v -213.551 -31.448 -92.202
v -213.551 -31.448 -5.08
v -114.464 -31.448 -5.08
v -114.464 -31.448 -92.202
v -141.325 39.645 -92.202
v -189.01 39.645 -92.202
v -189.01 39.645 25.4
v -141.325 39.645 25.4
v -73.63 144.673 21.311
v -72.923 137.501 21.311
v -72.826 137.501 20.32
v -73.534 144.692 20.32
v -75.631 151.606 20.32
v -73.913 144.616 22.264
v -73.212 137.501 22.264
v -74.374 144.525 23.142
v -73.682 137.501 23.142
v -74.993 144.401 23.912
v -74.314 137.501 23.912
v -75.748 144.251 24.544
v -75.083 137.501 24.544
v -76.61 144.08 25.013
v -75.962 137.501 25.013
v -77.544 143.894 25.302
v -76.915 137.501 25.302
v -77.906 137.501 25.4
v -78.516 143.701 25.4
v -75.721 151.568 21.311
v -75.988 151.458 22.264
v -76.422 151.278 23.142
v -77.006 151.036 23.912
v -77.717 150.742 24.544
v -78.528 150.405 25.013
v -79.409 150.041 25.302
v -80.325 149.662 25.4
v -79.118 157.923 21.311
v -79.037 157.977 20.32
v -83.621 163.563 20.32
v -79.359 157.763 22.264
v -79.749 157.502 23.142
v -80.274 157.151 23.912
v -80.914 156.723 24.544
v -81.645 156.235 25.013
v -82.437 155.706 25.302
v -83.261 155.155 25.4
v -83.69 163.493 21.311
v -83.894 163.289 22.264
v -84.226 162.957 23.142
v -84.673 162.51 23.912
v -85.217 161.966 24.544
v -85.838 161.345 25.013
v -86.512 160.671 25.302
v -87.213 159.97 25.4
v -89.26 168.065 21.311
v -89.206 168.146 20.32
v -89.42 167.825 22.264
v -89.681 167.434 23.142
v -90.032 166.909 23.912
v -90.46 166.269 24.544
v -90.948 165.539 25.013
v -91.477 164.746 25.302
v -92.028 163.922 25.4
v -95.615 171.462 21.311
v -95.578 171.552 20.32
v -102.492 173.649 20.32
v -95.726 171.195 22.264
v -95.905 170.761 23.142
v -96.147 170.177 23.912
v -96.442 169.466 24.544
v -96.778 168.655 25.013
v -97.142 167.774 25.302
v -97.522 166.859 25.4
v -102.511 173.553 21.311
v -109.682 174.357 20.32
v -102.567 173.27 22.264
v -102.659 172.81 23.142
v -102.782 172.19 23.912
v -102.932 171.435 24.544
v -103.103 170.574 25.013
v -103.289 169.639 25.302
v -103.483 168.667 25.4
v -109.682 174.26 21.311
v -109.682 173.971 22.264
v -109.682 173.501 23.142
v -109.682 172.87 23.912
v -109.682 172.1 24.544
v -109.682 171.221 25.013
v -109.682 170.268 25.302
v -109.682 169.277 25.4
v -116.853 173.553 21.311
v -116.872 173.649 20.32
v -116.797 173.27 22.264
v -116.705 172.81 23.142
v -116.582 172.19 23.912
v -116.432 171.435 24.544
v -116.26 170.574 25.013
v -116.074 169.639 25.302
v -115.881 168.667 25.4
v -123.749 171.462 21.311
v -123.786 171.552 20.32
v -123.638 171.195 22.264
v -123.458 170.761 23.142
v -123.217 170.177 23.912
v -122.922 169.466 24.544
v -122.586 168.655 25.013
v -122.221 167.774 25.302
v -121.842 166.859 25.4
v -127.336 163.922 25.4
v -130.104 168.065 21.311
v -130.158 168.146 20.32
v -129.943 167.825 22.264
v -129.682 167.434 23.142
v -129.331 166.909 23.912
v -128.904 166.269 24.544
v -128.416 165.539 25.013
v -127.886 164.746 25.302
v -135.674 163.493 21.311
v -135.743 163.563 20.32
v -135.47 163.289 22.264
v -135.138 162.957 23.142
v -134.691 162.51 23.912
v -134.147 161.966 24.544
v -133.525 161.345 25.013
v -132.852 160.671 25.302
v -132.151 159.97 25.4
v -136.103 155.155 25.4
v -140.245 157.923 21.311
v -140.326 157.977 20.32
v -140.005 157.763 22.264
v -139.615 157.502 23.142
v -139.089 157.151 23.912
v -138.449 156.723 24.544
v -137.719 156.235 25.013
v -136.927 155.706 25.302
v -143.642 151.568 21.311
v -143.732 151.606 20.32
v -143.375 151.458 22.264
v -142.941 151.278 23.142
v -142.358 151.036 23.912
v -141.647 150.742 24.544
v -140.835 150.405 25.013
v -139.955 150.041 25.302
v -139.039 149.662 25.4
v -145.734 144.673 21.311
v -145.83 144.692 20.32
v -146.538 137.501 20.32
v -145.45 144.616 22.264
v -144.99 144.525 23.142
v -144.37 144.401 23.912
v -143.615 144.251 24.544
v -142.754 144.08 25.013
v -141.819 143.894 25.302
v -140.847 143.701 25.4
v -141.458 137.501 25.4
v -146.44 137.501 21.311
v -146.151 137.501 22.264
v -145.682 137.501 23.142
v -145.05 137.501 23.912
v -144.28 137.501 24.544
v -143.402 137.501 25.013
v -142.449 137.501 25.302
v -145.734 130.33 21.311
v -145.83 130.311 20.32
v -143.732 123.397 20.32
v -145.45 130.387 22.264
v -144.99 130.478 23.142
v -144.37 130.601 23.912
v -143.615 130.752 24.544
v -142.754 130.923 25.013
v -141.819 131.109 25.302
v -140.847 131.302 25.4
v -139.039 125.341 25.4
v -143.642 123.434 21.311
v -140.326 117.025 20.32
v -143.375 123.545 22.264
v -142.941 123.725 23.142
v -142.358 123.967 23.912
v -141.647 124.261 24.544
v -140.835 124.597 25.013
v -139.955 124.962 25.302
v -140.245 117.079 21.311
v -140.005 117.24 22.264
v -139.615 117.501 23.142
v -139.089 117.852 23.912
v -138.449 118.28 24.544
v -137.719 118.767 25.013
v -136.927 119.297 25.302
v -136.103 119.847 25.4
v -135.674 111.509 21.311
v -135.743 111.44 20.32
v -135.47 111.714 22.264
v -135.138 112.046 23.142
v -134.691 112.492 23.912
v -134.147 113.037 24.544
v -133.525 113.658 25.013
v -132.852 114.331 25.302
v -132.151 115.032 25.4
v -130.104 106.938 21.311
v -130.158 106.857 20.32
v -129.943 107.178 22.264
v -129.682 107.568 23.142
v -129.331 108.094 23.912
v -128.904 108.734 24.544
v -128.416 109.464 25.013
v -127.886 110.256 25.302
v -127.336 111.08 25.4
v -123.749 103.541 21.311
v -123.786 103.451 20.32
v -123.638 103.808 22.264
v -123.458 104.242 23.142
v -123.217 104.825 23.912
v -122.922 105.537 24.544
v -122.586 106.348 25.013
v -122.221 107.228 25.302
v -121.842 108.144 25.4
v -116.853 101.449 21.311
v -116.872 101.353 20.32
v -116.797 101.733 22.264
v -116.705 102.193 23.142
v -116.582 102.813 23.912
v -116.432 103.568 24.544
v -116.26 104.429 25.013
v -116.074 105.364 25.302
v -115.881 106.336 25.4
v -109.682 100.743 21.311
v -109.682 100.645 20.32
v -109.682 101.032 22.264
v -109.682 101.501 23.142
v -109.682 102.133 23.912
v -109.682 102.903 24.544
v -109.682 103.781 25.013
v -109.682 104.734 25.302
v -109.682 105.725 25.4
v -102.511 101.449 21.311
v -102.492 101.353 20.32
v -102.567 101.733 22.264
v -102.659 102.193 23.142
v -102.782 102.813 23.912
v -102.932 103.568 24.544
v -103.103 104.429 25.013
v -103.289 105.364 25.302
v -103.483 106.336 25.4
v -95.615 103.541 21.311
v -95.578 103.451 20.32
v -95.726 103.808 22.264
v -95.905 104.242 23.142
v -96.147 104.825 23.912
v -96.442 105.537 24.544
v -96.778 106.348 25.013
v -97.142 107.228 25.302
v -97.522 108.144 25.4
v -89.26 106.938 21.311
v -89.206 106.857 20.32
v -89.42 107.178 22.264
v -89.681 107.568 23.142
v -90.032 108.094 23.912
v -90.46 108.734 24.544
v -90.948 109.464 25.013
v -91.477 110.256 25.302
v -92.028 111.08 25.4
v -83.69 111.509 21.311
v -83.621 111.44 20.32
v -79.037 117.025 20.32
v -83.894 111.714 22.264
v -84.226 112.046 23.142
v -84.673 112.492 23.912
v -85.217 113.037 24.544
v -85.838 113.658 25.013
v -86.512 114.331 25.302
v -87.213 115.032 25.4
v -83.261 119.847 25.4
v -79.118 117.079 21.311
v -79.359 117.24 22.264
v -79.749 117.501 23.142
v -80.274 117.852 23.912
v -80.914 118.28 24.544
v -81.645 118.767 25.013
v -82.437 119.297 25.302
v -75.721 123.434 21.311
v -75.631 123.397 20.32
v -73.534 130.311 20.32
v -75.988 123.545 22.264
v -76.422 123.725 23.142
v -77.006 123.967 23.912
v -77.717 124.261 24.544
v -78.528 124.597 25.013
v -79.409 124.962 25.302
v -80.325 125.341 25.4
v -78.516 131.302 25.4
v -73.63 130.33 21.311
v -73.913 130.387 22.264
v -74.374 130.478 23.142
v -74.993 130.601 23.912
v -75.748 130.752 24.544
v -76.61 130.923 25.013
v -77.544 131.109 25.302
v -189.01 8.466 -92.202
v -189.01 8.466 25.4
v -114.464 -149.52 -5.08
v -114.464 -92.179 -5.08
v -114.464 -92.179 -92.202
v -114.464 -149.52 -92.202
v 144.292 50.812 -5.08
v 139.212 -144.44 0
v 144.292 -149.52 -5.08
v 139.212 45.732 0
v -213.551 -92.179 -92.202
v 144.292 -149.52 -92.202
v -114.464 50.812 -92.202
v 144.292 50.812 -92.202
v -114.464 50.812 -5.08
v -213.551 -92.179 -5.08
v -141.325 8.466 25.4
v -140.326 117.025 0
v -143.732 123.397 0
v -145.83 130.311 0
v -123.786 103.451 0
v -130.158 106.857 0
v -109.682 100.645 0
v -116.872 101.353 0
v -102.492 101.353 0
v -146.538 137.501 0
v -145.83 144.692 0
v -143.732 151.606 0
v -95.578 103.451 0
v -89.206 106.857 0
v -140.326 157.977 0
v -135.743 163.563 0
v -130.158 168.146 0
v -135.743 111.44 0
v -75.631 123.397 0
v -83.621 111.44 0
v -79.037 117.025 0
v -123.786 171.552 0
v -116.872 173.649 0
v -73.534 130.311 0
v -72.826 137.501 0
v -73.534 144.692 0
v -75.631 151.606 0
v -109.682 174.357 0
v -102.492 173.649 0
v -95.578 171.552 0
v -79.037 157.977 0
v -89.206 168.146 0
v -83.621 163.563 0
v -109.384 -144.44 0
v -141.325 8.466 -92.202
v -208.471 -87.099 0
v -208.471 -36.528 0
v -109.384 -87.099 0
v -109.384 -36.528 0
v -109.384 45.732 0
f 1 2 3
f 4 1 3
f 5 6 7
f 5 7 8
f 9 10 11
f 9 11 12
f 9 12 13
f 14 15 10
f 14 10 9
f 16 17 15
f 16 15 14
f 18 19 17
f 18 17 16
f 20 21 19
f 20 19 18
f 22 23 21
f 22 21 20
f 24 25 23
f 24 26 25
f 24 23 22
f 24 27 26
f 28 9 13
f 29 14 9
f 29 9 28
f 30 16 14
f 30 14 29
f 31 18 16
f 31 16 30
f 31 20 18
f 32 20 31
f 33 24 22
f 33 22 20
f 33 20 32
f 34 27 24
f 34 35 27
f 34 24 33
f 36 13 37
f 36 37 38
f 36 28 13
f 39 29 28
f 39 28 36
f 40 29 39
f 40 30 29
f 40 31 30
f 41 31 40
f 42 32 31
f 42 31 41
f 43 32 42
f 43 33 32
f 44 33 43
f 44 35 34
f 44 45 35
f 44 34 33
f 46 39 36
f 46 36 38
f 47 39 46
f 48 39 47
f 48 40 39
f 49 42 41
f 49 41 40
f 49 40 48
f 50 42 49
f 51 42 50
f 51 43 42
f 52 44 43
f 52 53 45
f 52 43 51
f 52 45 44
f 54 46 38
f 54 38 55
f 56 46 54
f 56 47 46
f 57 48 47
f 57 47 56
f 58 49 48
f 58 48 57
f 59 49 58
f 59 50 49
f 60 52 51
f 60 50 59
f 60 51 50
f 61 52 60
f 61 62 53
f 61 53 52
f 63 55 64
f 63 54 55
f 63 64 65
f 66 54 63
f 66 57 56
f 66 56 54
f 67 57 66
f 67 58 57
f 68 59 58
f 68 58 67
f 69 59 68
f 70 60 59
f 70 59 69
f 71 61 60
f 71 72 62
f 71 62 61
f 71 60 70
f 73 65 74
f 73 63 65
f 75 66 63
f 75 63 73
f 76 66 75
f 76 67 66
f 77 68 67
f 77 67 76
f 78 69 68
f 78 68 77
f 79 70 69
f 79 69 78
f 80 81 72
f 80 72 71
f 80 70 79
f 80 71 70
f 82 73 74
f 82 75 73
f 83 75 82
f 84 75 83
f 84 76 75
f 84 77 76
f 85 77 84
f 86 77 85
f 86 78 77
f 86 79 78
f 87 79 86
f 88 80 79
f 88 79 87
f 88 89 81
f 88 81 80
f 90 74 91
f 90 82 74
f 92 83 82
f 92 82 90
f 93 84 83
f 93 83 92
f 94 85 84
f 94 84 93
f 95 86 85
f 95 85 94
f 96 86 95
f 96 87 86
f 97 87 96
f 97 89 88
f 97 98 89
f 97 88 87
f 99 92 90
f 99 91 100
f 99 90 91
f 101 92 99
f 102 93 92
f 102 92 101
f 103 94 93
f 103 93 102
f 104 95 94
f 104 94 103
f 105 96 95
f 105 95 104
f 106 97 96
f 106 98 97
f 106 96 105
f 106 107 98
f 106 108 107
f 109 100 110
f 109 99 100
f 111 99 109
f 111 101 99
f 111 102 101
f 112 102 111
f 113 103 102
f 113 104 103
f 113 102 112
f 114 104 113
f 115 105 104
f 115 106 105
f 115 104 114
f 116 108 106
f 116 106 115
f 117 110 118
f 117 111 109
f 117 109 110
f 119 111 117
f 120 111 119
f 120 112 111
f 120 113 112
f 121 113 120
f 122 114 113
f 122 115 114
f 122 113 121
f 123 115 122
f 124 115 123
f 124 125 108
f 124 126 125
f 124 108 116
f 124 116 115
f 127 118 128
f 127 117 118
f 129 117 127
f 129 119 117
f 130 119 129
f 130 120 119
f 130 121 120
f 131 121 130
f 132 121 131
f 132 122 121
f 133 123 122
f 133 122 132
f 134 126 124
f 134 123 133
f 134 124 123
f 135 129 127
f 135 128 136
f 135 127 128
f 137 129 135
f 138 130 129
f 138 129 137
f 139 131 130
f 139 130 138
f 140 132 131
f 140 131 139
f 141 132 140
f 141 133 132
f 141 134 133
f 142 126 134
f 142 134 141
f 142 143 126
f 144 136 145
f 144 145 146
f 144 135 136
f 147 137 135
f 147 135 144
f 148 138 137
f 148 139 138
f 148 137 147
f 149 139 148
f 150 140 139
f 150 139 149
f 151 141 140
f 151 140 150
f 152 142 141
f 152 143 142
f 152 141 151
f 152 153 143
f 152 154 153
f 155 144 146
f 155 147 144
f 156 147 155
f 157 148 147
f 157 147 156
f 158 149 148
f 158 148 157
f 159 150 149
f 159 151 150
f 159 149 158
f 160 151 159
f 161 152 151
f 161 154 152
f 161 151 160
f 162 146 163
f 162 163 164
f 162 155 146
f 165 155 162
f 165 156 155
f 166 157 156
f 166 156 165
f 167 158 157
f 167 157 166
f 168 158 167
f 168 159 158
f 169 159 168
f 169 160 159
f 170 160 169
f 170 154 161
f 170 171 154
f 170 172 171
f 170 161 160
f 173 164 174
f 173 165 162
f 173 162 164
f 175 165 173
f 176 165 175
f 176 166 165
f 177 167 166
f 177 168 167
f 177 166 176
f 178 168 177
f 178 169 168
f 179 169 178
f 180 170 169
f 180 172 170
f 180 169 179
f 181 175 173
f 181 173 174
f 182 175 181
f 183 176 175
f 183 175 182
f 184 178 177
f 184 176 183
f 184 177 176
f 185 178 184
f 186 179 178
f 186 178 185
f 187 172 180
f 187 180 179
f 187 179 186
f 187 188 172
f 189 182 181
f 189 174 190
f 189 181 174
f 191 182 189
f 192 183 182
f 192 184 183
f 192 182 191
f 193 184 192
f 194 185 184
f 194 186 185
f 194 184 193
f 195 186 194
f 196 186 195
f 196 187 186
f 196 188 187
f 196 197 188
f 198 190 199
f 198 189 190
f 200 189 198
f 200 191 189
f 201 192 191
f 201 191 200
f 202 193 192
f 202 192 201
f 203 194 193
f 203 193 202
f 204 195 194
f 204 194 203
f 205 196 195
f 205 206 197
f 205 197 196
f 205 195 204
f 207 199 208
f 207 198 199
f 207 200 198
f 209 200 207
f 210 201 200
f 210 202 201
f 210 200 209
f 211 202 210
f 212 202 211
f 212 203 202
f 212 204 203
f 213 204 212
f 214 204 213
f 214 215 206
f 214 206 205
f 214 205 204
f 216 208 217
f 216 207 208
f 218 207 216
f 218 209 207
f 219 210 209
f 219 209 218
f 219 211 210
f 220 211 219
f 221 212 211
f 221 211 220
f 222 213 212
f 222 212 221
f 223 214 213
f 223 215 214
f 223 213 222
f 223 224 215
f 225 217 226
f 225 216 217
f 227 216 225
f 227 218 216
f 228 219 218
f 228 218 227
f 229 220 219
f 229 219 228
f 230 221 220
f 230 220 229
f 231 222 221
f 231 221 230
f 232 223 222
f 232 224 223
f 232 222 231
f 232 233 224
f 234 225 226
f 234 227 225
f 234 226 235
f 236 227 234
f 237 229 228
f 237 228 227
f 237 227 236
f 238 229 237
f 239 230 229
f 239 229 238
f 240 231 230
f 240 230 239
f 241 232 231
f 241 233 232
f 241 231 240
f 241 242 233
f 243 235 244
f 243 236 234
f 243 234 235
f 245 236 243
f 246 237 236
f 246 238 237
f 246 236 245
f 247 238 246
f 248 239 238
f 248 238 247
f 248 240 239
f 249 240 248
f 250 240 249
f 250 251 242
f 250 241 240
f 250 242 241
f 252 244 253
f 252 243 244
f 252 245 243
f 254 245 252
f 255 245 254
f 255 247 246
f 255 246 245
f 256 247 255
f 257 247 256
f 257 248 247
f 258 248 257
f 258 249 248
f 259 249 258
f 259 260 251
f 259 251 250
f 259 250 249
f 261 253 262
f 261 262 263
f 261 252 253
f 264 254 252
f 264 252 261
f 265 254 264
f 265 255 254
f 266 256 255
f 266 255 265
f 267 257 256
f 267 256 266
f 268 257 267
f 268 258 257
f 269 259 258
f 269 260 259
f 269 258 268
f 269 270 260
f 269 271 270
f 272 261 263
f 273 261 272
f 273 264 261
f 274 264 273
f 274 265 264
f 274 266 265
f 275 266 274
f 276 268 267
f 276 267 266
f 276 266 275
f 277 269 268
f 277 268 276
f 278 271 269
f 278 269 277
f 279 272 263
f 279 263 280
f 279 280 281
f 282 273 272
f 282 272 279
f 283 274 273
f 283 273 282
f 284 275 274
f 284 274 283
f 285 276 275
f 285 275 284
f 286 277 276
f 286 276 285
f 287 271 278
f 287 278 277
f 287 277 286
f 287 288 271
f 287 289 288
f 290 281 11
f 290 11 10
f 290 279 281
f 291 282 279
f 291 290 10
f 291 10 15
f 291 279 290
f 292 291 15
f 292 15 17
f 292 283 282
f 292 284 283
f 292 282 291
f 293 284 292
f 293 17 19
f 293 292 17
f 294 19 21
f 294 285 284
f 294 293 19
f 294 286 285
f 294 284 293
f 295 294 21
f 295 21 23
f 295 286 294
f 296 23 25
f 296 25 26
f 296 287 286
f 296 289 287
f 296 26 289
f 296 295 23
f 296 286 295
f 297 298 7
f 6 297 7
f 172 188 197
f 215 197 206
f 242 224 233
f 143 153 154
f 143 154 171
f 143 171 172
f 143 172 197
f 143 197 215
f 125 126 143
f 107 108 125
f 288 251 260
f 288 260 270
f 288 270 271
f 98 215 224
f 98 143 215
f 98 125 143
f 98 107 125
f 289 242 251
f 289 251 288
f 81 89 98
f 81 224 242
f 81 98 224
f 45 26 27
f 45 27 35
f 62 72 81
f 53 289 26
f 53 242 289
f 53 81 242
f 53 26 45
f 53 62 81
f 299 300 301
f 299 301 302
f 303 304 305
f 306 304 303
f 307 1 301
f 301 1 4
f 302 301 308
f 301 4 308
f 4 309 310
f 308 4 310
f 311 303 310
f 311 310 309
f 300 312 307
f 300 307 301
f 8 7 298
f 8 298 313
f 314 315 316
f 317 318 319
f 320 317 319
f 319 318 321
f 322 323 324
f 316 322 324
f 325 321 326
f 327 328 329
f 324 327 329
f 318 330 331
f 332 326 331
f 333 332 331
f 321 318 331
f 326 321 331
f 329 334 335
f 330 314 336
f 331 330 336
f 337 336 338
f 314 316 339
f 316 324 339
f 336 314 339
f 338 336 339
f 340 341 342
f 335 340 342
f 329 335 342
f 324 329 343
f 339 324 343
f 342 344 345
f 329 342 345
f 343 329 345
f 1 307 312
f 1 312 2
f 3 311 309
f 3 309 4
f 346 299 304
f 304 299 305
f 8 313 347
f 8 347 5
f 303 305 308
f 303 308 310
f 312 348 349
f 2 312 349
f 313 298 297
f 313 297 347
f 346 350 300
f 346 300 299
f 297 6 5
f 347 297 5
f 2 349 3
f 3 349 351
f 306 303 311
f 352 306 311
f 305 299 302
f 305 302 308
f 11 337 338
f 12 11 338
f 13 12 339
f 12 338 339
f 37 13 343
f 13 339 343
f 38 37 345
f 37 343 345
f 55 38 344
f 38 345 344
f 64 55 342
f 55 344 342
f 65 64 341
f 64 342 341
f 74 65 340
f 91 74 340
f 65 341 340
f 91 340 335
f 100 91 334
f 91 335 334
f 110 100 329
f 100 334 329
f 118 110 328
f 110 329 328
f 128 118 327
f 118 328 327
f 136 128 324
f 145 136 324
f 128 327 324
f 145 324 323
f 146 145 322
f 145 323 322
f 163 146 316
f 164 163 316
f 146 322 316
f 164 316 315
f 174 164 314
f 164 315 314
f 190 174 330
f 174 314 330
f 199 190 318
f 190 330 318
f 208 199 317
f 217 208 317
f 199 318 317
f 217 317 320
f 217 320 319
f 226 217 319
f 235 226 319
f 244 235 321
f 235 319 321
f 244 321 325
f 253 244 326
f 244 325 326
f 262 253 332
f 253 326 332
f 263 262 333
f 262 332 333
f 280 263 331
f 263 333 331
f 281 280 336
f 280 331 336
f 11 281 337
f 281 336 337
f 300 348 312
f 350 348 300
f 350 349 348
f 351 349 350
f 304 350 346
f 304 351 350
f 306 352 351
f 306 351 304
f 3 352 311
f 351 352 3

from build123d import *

# Parameters (mm, degrees)
F0_W     = 47.685325
F0_H     = 31.179237
F1_DEPTH = 25.4
F0_W_2   = 99.086285
F0_H_2   = 60.73128
F2_DEPTH = 92.202
F3_R     = 36.856074
F4_DEPTH = 25.4
F5_R     = 5.08
F6_SIZE  = 5.08


with BuildPart() as f1:
    # F0 (on Top) → F1 (new body)
    with BuildSketch(Plane.XY):
        with Locations((-165.16766, 24.055476)):
            Rectangle(F0_W, F0_H)
    extrude(amount=F1_DEPTH)

    # F0 (on Top) → F2 (join)
    with BuildSketch(Plane.XY):
        Polygon((144.291982, 50.812375), (-114.464357, 50.812375), (-114.464357, -31.447981), (-114.464357, -92.179261), (-114.464357, -149.520412), (144.291982, -149.520412), align=None)
        with Locations((-164.007499, -61.813621)):
            Rectangle(F0_W_2, F0_H_2)
        with Locations((-165.16766, 24.055476)):
            Rectangle(F0_W, F0_H)
    extrude(amount=-F2_DEPTH)

    # F6
    f6_edges = [f1.edges().sort_by_distance(p)[0] for p in [
        (14.913812, 50.812375, 0),
        (-114.464357, 9.682197, 0),
        (-164.0075, -31.447981, 0),
        (-213.550642, -61.813621, 0),
        (-164.0075, -92.179261, 0),
        (-114.464357, -120.849837, 0),
        (14.913812, -149.520412, 0),
        (144.291982, -49.354019, 0),
    ]]
    chamfer(f6_edges, length=F6_SIZE)


with BuildPart() as f4:
    # F3 (on Top) → F4 (new body)
    with BuildSketch(Plane.XY):
        with Locations((-109.681778, 137.501329)):
            Circle(F3_R)
    extrude(amount=F4_DEPTH)

    # F5
    f5_edges = [f4.edges().sort_by_distance(p)[0] for p in [
        (-146.537851, 137.501329, 25.4),
    ]]
    fillet(f5_edges, radius=F5_R)


solid = Compound([f1.part, f4.part])
